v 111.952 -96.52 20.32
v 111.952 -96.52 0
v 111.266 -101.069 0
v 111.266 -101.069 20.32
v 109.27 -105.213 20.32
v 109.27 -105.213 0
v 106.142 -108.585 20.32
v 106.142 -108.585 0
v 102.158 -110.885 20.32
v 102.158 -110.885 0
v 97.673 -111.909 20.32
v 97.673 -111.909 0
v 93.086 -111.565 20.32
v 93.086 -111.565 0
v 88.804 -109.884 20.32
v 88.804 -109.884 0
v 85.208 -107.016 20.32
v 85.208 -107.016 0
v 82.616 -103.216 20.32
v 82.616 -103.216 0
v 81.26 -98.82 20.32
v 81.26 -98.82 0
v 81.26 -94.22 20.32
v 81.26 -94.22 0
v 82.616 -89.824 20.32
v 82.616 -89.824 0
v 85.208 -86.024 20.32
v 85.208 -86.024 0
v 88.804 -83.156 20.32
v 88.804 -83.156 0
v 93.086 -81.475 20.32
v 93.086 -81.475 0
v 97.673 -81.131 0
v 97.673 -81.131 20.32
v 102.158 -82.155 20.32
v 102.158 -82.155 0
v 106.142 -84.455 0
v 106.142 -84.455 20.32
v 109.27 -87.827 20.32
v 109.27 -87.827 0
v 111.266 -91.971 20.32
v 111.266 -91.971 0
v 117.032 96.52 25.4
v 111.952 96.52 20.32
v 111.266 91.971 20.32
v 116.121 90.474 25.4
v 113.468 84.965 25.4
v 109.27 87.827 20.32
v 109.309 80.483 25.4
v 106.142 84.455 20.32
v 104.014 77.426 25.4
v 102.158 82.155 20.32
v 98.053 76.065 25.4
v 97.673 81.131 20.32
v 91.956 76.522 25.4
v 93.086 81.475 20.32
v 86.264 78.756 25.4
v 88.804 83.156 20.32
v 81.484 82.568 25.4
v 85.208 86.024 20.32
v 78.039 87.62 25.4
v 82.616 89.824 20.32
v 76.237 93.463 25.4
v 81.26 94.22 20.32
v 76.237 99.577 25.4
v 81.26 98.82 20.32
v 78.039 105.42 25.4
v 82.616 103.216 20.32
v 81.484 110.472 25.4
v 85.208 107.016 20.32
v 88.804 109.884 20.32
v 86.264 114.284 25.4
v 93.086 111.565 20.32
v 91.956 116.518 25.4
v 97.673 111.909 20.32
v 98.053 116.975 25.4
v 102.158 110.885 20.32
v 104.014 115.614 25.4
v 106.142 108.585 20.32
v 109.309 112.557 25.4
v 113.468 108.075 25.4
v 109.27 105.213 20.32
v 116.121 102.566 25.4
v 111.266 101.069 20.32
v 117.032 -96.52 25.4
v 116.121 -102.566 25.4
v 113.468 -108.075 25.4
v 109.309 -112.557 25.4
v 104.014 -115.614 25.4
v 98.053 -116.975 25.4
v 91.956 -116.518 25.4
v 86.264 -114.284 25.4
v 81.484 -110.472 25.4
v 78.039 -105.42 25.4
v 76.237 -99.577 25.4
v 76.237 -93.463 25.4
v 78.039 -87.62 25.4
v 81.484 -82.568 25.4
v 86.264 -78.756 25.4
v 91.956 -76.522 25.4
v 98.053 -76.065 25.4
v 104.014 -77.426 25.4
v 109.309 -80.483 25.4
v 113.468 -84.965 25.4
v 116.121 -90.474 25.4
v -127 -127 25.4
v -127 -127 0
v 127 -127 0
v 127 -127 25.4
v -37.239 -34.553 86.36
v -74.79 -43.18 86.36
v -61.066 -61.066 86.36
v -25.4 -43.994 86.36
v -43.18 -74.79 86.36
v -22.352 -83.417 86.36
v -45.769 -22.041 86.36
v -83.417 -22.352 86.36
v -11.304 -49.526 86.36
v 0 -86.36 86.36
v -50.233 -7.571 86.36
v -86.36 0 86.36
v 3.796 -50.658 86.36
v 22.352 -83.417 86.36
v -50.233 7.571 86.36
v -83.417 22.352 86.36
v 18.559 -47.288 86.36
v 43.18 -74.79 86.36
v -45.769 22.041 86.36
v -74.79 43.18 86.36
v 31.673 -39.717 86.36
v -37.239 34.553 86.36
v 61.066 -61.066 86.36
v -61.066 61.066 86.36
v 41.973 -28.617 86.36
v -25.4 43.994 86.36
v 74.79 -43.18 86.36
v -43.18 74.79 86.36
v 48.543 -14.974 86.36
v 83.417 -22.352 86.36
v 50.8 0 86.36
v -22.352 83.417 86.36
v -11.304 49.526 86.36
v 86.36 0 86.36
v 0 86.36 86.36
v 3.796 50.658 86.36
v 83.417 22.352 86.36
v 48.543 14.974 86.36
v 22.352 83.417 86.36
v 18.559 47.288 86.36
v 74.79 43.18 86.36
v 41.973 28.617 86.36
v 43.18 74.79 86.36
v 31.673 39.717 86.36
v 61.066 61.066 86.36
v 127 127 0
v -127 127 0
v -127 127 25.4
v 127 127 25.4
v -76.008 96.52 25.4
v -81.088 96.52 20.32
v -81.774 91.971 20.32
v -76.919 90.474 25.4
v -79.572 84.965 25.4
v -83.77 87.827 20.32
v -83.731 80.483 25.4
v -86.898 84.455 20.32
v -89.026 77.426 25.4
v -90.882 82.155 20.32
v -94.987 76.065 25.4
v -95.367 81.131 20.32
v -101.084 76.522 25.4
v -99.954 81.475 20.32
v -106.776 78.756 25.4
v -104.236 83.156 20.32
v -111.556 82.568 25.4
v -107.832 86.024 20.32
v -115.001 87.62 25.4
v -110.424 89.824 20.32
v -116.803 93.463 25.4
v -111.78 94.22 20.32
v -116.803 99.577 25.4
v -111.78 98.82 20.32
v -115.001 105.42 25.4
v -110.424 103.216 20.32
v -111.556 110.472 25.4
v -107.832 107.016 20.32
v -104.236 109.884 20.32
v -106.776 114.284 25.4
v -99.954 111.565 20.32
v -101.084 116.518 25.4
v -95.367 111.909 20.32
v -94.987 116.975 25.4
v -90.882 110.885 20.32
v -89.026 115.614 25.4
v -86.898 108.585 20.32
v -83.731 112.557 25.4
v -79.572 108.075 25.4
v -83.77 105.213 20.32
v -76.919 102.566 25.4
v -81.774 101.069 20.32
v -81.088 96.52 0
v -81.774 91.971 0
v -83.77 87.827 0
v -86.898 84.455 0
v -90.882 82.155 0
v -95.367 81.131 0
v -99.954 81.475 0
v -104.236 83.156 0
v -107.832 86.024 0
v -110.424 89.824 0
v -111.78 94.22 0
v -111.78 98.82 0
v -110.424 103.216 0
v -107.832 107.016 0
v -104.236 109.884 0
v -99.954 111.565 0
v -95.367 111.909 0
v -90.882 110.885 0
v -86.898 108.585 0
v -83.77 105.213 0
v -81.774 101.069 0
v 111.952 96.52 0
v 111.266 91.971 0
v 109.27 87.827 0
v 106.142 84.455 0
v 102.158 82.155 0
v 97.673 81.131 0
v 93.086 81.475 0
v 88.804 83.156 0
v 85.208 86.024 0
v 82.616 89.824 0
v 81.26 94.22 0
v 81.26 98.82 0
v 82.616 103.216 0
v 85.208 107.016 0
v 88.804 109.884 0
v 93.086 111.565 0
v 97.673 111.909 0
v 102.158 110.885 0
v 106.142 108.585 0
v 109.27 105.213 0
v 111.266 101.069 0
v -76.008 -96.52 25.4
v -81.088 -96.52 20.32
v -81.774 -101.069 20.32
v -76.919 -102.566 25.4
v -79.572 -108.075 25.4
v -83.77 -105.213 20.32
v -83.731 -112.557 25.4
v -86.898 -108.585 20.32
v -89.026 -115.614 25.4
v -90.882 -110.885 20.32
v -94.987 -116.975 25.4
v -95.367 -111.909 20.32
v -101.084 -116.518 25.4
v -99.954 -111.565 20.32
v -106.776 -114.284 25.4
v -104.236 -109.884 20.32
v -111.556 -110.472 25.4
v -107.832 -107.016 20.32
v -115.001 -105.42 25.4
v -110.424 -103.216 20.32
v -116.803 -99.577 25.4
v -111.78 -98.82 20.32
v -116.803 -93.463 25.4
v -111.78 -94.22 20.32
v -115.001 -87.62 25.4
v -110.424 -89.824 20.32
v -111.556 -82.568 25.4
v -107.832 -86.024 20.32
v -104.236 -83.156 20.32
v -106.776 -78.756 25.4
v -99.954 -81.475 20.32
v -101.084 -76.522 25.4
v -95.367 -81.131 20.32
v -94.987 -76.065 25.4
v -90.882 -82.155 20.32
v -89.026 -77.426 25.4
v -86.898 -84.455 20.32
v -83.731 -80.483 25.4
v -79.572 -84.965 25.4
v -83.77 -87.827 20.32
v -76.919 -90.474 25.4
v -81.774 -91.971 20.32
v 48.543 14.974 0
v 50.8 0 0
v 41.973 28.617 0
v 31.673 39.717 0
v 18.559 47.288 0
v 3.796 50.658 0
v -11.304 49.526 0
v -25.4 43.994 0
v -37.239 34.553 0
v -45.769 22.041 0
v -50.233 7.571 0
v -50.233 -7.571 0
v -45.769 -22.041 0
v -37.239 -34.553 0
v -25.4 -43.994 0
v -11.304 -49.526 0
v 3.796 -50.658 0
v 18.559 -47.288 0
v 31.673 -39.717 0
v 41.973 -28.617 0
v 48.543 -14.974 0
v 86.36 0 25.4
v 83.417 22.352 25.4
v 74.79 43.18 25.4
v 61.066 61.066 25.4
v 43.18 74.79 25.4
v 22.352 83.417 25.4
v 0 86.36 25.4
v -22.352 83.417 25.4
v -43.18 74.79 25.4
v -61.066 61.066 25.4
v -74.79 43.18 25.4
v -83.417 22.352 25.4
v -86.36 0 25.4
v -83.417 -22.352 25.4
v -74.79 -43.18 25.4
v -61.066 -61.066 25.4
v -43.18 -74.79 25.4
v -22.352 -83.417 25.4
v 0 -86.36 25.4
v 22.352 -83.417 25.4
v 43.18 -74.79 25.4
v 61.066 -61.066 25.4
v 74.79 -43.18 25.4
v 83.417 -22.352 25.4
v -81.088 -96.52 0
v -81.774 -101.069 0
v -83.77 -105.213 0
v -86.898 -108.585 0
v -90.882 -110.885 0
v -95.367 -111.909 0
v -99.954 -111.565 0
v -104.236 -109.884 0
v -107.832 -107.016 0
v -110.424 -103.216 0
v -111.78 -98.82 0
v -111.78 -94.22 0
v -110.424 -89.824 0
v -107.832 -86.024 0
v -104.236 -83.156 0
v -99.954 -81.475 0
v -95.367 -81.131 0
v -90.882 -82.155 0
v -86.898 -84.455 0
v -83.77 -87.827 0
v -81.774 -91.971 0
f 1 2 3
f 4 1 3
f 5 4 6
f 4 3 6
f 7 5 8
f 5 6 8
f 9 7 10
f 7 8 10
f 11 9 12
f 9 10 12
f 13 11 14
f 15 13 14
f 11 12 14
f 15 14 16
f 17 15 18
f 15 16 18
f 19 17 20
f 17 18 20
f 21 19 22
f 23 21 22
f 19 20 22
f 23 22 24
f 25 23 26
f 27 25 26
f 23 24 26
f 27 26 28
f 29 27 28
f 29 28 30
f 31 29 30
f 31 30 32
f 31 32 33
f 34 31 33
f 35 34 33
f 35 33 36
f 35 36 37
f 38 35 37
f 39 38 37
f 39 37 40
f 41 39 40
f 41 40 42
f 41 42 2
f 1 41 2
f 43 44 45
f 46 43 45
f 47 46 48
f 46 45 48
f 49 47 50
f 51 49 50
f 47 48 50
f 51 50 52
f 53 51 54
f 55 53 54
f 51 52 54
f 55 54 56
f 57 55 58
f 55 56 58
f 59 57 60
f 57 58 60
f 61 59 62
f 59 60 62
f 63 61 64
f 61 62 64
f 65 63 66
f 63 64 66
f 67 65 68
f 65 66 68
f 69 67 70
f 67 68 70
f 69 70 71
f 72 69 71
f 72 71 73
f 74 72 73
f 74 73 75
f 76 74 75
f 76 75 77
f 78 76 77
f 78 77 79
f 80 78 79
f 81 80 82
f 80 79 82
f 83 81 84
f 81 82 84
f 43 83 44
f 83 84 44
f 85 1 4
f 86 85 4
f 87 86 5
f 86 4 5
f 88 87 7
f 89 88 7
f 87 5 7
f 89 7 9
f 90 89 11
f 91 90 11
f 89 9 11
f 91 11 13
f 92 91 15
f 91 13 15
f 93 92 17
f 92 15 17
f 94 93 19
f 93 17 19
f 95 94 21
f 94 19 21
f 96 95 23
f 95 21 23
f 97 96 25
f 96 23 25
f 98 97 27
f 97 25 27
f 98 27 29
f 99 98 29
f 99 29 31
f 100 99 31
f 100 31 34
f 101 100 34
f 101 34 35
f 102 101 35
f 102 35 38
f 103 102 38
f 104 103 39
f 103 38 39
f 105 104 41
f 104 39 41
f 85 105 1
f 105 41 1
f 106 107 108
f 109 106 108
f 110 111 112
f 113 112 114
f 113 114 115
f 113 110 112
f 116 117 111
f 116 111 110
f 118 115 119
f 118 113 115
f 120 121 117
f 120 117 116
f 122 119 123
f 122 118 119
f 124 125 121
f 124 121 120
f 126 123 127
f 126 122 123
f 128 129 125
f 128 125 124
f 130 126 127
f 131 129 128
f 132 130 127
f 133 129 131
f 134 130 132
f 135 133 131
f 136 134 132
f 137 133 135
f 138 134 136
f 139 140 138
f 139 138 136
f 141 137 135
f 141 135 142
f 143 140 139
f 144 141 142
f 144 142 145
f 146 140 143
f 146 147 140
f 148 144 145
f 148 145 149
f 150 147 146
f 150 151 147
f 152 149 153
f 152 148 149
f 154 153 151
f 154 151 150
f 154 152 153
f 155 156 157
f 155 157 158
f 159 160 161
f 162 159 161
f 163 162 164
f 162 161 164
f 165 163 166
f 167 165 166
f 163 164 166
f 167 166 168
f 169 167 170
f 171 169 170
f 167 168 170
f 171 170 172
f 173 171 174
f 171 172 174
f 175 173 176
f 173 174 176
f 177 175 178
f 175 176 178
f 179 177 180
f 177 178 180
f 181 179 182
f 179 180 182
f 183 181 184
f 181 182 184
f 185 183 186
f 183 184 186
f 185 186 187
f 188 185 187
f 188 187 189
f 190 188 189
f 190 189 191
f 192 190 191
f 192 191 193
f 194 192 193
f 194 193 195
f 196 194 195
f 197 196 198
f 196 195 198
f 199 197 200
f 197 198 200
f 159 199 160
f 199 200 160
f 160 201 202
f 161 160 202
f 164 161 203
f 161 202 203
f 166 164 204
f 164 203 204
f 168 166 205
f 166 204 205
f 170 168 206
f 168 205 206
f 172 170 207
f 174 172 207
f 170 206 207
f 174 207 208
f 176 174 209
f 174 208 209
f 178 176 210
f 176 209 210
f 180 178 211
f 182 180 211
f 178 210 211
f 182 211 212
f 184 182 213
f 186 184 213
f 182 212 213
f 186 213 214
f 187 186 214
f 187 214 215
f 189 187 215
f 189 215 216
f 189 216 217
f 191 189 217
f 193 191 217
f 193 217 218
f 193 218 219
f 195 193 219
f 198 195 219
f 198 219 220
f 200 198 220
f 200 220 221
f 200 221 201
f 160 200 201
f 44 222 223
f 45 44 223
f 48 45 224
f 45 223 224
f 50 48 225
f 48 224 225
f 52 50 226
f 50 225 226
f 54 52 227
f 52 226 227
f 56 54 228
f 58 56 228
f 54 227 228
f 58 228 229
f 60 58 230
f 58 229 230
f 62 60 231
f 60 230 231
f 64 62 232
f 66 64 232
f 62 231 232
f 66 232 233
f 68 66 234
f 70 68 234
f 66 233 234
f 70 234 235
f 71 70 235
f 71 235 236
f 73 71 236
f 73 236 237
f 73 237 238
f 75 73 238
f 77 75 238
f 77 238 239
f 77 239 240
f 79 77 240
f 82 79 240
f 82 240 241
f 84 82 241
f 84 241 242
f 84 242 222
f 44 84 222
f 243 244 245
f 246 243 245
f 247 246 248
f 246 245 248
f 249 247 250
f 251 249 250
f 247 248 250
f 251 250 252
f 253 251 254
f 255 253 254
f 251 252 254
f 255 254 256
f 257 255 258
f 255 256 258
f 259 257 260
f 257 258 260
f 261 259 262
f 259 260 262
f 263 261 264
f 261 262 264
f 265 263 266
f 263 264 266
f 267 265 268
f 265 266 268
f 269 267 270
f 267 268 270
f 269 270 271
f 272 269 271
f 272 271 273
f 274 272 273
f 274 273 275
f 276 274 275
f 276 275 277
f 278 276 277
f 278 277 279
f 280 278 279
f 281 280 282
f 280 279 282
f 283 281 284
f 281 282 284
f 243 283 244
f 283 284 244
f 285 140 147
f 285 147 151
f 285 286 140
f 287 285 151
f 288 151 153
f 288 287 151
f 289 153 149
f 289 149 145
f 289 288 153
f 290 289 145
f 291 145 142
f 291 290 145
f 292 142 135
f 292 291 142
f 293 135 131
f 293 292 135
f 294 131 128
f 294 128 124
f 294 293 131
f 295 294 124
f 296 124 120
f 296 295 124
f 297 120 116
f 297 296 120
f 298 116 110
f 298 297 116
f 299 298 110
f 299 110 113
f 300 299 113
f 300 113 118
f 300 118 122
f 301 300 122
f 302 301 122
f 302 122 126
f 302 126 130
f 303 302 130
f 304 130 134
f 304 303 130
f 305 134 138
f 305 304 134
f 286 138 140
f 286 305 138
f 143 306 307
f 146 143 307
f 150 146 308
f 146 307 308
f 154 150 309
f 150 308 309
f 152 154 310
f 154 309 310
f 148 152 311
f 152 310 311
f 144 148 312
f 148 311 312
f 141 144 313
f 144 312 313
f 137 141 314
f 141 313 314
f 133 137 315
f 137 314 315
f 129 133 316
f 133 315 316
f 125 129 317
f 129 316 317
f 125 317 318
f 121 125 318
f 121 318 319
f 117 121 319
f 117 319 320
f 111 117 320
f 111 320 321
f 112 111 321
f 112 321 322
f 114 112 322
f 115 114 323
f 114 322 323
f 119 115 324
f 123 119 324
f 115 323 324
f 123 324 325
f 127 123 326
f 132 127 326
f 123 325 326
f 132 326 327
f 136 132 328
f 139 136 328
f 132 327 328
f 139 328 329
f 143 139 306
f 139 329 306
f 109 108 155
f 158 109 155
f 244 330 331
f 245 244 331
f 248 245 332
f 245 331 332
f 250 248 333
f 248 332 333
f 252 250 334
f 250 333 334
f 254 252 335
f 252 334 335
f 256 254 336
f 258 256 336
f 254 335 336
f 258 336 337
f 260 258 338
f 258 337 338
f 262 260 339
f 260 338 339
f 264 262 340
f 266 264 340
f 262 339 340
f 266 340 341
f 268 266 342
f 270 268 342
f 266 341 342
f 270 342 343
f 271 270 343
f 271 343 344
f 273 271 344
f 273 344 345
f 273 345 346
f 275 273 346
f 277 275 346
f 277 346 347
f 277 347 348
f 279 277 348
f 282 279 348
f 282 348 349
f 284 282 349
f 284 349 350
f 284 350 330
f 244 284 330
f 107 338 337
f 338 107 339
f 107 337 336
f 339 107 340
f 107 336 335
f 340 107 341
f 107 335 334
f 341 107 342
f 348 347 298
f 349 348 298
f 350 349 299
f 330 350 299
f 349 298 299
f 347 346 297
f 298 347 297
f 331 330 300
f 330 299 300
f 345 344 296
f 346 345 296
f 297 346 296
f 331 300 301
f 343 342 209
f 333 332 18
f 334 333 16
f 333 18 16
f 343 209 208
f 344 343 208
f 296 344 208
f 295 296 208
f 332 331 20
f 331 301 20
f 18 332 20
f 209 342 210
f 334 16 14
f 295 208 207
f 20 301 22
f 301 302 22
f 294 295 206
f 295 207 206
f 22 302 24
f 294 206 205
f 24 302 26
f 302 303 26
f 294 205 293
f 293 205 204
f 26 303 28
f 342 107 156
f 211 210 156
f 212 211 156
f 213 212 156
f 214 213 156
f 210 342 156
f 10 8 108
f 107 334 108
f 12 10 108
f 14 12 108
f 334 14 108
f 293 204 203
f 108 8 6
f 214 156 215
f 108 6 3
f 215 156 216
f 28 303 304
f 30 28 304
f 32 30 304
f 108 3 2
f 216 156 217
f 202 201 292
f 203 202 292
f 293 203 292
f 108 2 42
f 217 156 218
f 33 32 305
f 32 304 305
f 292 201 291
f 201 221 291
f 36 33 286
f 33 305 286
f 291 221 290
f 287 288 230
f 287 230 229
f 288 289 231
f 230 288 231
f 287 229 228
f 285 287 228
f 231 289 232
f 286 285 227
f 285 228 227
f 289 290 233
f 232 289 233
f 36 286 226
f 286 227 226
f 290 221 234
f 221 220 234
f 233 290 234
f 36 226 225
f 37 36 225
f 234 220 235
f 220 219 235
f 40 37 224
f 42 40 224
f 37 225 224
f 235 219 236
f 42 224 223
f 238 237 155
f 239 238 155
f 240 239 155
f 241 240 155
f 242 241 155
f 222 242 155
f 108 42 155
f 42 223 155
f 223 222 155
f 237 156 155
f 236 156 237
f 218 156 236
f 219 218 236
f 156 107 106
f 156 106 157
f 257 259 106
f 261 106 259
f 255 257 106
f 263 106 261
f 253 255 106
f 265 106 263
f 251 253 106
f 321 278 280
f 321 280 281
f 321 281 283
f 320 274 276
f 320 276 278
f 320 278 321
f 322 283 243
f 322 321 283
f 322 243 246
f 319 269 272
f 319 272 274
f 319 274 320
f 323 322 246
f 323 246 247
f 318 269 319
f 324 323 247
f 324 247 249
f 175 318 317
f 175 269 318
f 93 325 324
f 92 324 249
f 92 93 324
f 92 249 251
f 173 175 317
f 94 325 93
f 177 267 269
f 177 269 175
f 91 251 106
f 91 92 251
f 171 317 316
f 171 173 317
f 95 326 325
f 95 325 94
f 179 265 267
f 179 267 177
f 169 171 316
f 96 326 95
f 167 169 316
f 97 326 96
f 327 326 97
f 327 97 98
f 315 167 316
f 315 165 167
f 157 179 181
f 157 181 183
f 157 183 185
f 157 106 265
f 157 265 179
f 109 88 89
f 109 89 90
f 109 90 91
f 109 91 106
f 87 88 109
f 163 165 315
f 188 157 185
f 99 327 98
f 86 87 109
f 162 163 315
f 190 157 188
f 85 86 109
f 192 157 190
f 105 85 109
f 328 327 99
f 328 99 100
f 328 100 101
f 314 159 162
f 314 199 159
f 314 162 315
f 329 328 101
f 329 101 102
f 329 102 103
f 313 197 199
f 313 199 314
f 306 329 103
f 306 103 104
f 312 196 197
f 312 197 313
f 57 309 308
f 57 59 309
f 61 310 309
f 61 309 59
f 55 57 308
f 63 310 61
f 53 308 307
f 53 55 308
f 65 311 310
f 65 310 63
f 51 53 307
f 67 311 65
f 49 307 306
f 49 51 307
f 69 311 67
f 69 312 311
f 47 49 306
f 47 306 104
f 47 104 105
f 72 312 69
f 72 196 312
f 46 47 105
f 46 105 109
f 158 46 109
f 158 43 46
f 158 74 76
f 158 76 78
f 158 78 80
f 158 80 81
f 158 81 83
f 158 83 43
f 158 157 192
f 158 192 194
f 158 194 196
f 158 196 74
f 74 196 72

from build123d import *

# Parameters (mm, degrees)
F0_W     = 254
F0_H     = 254
F0_R     = 50.8
F1_DEPTH = 25.4
F2_R     = 86.3600000739
F2_R_2   = 50.8
F3_DEPTH = 60.96
F4_R     = 15.431866001
F5_DEPTH = 162.56
F6_SIZE  = 5.08


with BuildPart() as f1:
    # F0 (on Top) → F1 (new body)
    with BuildSketch(Plane.XY):
        Rectangle(F0_W, F0_H)
        Circle(F0_R, mode=Mode.SUBTRACT)
    extrude(amount=F1_DEPTH)

    # F2 (on face) → F3 (join)
    with BuildSketch(Plane.XY.offset(25.4)):
        Circle(F2_R)
        Circle(F2_R_2, mode=Mode.SUBTRACT)
    extrude(amount=F3_DEPTH)

    # F4 (on face) → F5 (cut)
    with BuildSketch(Plane(origin=(0, 0, 0), x_dir=(1, 0, 0), z_dir=(0, 0, -1))):
        with Locations((-96.5199992061, -96.5199992061)):
            Circle(F4_R)
        with Locations((96.5199992061, -96.5199992061)):
            Circle(F4_R)
        with Locations((96.5199992061, 96.5199992061)):
            Circle(F4_R)
        with Locations((-96.5199992061, 96.5199992061)):
            Circle(F4_R)
    extrude(amount=-F5_DEPTH, mode=Mode.SUBTRACT)

    # F6
    f6_edges = [f1.edges().sort_by_distance(p)[0] for p in [
        (-111.951865, 96.519999, 25.4),
        (81.088133, 96.519999, 25.4),
        (81.088133, -96.519999, 25.4),
        (-111.951865, -96.519999, 25.4),
    ]]
    chamfer(f6_edges, length=F6_SIZE)


solid = f1.part
